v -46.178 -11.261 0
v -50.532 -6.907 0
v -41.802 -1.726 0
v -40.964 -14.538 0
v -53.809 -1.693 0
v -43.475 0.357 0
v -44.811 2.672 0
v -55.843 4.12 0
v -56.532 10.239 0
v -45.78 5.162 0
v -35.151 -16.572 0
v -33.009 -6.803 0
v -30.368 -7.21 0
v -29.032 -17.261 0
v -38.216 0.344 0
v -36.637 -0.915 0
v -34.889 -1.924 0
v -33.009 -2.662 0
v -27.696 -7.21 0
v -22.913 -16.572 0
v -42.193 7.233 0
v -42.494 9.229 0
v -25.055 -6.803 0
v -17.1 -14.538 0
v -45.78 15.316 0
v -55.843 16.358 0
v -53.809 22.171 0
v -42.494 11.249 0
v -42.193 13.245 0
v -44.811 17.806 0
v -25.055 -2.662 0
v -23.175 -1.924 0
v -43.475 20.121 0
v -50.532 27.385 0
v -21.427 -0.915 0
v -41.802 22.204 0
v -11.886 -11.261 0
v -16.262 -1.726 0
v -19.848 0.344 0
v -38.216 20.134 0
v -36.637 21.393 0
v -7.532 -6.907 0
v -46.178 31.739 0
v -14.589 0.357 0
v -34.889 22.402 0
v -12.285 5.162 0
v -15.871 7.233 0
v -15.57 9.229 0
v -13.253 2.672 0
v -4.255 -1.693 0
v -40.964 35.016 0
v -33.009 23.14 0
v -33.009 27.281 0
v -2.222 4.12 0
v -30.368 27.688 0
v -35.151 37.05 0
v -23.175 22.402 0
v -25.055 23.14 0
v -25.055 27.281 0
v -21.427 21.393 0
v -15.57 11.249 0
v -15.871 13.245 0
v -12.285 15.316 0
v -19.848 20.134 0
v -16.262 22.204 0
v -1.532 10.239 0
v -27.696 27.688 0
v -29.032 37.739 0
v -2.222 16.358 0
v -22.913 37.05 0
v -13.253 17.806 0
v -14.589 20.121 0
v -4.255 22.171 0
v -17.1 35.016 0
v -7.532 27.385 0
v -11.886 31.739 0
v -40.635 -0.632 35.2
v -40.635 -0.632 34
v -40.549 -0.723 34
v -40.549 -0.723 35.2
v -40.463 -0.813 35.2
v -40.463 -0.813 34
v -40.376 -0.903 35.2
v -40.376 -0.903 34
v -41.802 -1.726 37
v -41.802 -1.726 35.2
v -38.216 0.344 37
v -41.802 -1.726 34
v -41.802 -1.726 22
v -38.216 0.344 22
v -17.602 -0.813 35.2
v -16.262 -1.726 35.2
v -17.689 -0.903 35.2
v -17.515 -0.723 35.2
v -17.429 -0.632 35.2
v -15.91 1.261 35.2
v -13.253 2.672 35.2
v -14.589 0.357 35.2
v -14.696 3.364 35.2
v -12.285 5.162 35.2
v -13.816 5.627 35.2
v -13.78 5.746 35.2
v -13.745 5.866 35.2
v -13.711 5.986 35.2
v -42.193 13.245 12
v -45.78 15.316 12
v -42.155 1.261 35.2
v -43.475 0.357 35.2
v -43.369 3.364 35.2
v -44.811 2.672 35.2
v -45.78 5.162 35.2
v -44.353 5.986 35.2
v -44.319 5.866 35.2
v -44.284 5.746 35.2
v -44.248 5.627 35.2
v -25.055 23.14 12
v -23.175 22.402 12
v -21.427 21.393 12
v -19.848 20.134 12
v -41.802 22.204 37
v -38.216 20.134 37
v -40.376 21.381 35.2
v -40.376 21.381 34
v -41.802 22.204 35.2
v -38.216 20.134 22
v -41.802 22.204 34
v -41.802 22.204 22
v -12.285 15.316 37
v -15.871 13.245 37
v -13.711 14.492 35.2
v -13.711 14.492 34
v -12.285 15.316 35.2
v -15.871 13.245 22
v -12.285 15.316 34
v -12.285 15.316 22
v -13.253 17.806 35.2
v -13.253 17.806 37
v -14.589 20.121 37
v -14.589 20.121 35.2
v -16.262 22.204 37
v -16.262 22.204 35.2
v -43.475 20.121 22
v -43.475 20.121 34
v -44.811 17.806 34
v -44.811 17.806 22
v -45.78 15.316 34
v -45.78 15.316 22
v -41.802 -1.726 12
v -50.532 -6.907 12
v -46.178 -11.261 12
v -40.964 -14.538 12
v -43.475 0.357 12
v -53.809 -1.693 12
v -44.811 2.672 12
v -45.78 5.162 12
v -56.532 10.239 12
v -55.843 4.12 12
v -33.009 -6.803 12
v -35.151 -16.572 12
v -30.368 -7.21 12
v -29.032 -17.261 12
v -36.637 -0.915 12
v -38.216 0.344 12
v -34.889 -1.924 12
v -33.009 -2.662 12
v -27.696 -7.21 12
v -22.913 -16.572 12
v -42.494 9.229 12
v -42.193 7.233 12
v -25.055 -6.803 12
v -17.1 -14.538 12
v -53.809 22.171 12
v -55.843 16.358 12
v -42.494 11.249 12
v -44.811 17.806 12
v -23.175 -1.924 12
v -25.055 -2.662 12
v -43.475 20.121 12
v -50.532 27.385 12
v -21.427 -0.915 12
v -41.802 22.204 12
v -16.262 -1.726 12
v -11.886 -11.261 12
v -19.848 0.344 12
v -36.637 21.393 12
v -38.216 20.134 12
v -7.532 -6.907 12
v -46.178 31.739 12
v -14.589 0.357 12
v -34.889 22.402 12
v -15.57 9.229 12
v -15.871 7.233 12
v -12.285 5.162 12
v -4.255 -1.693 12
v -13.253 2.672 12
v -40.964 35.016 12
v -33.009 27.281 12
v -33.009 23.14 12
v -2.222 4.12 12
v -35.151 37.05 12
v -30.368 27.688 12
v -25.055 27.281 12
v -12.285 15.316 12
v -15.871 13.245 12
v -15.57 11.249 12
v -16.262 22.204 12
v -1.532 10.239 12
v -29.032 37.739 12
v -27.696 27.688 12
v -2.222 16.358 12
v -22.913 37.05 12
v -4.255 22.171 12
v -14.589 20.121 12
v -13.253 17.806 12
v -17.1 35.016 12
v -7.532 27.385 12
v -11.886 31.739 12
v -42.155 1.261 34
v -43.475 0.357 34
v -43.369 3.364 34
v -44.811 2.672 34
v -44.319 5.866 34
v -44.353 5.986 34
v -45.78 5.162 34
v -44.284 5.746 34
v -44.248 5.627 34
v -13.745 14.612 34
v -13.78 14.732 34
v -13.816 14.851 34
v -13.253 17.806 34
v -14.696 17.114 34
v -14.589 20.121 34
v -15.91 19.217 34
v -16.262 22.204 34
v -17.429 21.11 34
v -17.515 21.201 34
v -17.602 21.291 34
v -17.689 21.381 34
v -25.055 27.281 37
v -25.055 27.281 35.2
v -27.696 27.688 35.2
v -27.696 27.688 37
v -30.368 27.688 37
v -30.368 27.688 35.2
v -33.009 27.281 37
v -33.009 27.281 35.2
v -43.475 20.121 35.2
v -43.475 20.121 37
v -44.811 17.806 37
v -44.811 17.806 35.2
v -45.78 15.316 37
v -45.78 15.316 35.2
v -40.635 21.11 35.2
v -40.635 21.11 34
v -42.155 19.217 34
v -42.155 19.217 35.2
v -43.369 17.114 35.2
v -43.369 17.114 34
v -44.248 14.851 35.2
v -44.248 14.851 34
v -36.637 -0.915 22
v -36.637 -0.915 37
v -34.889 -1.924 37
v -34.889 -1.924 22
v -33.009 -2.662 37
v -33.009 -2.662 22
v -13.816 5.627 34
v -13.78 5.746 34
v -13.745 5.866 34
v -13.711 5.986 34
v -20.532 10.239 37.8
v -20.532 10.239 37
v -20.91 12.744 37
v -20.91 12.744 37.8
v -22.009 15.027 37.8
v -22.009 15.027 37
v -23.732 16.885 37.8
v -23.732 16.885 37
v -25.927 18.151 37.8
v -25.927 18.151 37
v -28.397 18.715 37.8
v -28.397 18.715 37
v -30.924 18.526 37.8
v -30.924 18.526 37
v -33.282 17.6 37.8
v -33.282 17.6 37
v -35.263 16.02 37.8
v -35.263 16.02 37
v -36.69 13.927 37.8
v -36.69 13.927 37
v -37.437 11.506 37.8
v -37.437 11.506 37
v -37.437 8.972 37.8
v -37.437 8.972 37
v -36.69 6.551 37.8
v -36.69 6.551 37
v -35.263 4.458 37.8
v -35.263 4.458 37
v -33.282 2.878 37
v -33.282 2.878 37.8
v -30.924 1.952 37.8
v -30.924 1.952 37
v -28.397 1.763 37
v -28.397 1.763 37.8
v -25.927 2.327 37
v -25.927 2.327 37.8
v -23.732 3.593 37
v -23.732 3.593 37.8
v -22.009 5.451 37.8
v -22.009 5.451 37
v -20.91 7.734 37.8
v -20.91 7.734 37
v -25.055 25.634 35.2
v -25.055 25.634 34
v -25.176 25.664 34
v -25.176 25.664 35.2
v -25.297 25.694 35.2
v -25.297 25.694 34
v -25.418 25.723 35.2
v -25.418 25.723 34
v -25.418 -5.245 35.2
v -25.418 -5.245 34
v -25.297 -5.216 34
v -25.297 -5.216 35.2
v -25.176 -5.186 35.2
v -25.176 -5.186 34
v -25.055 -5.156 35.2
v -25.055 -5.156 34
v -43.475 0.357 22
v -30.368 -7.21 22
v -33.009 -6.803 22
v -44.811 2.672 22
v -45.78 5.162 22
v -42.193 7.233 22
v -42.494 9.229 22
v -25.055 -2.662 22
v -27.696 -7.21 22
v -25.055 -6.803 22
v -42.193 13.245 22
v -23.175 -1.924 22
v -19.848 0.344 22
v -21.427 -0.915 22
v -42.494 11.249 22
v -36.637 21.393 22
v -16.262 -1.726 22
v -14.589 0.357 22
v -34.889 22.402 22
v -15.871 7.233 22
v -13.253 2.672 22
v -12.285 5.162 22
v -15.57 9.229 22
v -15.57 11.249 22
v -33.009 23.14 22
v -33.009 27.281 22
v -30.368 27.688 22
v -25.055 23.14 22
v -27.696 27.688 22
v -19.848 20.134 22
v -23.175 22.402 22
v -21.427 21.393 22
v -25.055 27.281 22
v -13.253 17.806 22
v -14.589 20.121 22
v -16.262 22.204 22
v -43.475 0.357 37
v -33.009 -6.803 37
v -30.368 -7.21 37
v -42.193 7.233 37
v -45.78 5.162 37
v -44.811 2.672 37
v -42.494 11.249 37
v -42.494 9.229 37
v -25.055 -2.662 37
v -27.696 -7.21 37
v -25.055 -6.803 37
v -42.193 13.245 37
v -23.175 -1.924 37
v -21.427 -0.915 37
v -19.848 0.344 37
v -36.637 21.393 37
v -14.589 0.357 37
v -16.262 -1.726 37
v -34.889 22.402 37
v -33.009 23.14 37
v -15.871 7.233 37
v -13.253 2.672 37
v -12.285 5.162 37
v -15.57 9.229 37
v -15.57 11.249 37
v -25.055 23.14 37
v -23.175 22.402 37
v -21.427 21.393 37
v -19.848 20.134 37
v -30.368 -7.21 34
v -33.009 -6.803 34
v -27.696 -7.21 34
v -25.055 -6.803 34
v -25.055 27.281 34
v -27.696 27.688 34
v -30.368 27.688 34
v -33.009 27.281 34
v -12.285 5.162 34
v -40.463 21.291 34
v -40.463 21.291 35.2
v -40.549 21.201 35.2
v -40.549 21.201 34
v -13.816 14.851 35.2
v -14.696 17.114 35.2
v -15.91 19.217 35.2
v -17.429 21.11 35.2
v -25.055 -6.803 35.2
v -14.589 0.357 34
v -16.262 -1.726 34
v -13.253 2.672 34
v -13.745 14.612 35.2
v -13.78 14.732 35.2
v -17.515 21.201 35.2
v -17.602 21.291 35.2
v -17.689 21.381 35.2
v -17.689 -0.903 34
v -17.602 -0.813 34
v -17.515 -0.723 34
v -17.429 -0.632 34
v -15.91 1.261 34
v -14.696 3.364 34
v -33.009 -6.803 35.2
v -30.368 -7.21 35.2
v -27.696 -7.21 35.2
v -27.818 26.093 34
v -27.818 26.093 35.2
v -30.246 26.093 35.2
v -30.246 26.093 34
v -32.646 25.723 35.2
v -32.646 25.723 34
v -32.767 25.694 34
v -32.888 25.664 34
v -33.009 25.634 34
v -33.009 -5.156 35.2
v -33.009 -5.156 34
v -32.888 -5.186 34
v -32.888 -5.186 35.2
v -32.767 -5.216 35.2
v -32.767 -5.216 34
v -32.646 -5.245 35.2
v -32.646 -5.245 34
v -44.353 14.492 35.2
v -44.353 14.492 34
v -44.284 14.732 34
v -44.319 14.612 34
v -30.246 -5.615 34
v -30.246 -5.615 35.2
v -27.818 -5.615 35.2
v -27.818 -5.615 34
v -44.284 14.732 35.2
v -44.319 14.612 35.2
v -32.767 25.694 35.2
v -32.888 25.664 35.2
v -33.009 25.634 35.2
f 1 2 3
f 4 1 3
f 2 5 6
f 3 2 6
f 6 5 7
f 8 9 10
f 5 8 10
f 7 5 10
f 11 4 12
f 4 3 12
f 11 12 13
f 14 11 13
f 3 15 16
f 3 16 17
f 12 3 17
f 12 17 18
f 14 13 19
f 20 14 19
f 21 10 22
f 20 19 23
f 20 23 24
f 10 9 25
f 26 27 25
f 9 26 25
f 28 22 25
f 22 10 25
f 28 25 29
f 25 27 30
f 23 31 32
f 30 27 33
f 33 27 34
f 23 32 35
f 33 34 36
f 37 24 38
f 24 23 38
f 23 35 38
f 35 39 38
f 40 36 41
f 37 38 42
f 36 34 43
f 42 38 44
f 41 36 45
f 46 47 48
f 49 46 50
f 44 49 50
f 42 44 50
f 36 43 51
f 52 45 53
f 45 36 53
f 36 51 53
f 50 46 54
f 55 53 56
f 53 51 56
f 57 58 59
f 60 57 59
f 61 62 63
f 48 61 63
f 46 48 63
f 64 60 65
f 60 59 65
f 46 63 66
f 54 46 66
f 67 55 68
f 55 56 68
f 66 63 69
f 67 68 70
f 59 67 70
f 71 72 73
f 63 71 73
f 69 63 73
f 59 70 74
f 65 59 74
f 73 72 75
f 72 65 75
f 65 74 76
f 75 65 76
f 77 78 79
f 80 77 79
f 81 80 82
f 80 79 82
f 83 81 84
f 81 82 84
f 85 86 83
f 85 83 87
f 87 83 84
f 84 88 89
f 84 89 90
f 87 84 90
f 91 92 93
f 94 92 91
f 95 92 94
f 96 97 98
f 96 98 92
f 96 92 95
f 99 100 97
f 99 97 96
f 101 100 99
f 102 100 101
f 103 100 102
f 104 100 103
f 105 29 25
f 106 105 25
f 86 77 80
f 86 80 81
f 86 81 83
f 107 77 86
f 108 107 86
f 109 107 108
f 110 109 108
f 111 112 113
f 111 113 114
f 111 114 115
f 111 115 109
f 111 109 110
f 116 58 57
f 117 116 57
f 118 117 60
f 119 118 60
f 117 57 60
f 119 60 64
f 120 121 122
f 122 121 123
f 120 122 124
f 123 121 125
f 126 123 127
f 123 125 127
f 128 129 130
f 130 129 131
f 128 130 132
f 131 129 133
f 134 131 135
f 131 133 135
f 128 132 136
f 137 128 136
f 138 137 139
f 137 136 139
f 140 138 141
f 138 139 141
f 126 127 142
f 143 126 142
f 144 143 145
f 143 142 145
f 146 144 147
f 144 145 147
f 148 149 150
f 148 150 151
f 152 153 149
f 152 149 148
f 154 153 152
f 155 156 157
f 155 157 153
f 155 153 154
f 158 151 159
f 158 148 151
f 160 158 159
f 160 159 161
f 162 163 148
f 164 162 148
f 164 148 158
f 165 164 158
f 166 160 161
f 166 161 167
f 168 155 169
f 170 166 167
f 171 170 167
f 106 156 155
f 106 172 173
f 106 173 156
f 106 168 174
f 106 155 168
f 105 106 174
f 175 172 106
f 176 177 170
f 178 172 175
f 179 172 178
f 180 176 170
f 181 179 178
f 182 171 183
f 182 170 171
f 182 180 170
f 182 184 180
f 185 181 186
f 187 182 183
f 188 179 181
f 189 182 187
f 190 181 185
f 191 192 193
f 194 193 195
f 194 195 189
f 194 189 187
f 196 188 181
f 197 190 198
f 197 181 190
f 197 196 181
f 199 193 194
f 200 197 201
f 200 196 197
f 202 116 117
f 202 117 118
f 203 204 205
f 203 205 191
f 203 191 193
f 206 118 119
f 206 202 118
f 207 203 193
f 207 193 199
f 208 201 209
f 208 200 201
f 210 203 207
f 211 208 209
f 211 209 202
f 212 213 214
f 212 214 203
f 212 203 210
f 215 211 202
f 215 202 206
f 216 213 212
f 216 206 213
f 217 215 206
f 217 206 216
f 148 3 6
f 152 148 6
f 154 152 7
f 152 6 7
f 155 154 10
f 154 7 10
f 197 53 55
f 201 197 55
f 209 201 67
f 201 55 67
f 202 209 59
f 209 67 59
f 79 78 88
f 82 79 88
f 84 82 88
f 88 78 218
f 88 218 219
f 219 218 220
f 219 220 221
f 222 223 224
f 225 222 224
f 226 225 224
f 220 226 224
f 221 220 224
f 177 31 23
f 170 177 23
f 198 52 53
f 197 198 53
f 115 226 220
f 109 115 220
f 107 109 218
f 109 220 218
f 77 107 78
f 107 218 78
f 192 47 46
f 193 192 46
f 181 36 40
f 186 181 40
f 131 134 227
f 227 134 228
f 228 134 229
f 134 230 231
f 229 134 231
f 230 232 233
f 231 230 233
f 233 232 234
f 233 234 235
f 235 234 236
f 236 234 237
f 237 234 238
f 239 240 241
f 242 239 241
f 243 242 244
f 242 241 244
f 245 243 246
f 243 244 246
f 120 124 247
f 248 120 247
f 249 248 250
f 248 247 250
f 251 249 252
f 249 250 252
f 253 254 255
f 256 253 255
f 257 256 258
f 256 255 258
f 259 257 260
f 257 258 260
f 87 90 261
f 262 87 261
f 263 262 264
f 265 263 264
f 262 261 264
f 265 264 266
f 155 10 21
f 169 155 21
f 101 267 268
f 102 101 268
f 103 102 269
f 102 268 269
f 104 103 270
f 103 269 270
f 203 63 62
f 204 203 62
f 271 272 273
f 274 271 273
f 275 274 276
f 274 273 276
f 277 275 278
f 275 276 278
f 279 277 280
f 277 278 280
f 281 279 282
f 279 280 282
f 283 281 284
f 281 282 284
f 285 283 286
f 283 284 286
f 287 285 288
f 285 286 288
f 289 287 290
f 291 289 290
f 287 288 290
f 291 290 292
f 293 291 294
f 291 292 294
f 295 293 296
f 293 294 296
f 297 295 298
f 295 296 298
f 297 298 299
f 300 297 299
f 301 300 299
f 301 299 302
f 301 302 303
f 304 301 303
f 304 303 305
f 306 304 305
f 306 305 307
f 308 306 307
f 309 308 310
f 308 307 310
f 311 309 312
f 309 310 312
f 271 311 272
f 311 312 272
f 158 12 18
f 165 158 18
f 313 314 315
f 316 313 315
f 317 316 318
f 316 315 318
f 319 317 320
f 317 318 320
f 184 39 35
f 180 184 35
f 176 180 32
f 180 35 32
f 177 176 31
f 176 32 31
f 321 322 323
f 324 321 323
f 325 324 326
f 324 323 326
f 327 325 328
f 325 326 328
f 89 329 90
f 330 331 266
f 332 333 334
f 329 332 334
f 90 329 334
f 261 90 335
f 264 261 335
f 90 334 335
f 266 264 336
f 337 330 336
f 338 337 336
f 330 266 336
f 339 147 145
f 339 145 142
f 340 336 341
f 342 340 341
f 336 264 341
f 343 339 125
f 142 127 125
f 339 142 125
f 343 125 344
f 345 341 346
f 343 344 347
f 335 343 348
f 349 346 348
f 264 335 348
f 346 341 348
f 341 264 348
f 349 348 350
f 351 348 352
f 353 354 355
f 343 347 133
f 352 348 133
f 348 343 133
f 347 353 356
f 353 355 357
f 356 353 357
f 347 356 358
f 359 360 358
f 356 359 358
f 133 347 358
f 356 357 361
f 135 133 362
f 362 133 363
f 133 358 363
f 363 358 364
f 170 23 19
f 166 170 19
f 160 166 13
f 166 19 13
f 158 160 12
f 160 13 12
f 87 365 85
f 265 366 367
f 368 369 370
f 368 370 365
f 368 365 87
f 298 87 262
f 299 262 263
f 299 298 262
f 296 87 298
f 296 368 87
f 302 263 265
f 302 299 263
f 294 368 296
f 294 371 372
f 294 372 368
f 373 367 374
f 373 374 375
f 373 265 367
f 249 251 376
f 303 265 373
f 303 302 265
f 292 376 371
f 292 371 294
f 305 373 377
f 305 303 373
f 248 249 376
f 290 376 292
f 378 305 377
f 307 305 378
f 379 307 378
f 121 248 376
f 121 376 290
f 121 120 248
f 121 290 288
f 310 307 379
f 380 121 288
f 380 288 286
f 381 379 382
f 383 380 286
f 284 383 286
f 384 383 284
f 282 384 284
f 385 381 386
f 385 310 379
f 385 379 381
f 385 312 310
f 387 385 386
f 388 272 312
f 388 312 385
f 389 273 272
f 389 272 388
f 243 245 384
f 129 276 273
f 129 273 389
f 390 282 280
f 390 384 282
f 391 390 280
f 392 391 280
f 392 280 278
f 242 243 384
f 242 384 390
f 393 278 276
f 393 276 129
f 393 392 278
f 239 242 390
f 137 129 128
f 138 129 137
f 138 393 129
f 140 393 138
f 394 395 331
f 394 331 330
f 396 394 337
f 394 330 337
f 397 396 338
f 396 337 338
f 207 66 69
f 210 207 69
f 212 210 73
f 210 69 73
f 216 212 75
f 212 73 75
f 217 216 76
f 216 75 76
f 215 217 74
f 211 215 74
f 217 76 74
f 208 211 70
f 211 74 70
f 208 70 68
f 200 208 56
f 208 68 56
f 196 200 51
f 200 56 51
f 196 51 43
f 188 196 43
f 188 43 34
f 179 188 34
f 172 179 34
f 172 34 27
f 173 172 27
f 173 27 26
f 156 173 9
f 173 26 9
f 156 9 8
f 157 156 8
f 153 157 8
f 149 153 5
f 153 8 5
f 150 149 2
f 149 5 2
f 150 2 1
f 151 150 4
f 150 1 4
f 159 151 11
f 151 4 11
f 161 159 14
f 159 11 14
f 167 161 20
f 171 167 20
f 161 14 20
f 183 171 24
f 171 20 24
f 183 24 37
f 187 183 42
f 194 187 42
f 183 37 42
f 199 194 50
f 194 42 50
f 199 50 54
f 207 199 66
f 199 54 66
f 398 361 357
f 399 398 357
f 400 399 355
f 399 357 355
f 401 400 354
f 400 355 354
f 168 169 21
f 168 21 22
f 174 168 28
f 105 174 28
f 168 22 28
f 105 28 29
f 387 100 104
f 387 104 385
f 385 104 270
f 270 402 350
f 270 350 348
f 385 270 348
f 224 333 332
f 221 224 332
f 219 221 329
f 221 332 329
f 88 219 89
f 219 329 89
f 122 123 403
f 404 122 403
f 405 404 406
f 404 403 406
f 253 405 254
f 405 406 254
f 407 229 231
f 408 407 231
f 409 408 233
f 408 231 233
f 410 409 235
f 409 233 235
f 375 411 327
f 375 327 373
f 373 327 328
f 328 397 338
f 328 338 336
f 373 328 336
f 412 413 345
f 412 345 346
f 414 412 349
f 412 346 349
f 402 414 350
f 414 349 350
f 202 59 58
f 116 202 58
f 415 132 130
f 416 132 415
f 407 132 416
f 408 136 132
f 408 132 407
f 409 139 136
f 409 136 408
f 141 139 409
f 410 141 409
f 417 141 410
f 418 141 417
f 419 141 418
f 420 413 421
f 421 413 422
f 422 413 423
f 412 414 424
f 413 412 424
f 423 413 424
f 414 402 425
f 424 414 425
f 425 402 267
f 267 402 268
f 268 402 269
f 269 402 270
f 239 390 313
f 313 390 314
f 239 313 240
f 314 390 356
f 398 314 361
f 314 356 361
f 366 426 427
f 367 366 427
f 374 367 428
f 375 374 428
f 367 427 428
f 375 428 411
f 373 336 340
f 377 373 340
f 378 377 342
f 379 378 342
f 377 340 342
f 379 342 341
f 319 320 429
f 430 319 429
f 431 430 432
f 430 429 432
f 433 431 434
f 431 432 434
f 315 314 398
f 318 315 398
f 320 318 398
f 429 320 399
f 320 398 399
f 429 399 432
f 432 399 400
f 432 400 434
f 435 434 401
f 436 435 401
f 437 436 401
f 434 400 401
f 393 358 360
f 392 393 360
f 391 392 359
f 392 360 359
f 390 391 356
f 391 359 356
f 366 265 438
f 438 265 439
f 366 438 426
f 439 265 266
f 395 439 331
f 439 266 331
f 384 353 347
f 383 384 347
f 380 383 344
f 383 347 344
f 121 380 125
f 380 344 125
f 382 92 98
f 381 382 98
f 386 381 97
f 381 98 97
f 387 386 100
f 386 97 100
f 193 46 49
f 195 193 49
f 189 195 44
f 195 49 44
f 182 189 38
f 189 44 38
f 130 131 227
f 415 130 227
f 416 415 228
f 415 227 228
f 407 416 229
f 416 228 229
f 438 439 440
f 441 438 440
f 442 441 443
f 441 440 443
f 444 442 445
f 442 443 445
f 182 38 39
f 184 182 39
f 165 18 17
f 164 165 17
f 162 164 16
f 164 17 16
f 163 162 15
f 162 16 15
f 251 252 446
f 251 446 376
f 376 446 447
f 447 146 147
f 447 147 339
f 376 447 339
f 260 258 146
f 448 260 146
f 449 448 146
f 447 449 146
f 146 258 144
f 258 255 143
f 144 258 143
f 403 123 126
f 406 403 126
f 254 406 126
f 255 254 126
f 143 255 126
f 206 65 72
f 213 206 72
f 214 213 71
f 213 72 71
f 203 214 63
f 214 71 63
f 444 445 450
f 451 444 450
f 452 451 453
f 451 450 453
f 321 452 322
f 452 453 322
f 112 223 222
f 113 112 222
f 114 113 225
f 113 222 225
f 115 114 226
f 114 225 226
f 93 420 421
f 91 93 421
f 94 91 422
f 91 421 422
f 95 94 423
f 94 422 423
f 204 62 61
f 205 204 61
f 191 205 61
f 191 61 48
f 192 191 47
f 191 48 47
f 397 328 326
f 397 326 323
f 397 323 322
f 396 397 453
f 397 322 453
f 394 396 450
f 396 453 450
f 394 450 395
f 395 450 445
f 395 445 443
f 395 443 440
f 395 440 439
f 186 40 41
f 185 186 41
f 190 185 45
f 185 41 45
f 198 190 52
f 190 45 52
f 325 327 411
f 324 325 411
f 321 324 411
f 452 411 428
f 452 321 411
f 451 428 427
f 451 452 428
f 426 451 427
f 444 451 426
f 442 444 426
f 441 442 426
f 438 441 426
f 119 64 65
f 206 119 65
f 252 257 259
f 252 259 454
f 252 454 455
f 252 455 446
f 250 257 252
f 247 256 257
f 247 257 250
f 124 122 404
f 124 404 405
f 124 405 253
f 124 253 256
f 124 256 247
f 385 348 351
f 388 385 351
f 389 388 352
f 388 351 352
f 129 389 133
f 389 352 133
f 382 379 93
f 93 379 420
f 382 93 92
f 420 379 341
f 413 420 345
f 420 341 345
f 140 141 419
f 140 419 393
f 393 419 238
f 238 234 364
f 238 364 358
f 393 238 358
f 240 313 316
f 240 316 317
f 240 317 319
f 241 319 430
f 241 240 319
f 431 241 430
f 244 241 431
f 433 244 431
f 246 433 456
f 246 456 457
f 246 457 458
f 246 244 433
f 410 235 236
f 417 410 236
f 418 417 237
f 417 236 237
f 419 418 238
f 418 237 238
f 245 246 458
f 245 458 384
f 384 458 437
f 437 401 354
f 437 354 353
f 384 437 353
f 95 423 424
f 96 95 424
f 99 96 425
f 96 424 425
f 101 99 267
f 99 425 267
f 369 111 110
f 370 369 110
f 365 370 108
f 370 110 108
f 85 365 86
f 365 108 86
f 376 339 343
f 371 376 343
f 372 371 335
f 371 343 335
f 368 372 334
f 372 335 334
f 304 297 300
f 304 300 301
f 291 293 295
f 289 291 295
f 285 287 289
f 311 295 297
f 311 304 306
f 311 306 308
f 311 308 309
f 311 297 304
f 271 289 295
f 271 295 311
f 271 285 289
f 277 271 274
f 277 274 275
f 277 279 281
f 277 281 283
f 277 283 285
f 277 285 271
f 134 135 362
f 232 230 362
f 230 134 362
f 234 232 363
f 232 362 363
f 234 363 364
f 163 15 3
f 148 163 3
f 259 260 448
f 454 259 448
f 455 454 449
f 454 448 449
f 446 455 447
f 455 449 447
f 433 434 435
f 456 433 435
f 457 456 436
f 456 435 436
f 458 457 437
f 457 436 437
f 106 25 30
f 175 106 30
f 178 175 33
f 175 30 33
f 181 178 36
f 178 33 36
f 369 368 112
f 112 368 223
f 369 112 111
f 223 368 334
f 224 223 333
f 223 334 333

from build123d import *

# Parameters (mm, degrees)
TIRE_OUTBOARD_SPLINES_OUTLINE_R = 27.5
TIRE_OUTBOARD_SPLINES_DEPTH     = 12
BOSS_EXTRUDE1_DEPTH             = 15
CUT_EXTRUDE1_DEPTH              = 1.2
SKETCH4_R                       = 8.5
BOSS_EXTRUDE2_DEPTH             = 0.8


# Read off the part's stored shape, not the designer's step: Tire_Outboard_Splines
with BuildPart() as part:
    # Tire_Outboard_Splines outline → Tire_Outboard_Splines (new body)
    with BuildSketch(Plane.XY):
        with Locations((-29.032124352, 10.239008142)):
            Circle(TIRE_OUTBOARD_SPLINES_OUTLINE_R)
        with BuildLine():
            Line((-41.802331989, 22.204449918), (-38.215930705, 20.133840171))
            ThreePointArc((-38.215930705, 20.133840171), (-35.782124353, 21.930351093), (-33.00939708, 23.139833761))
            Line((-33.00939708, 23.139833761), (-33.00939708, 27.281053256))
            ThreePointArc((-33.00939708, 27.281053256), (-29.032124353, 27.739008142), (-25.054851625, 27.281053256))
            Line((-25.054851625, 27.281053256), (-25.054851625, 23.139833761))
            ThreePointArc((-25.054851625, 23.139833761), (-22.282124352, 21.930351093), (-19.848318, 20.133840171))
            Line((-19.848318, 20.133840171), (-16.261916715, 22.204449918))
            ThreePointArc((-16.261916715, 22.204449918), (-13.876679786, 18.989008142), (-12.284643988, 15.315611479))
            Line((-12.284643988, 15.315611479), (-15.871045273, 13.245001732))
            ThreePointArc((-15.871045273, 13.245001732), (-15.532124352, 10.239008142), (-15.871045273, 7.233014552))
            Line((-15.871045273, 7.233014552), (-12.284643988, 5.162404805))
            ThreePointArc((-12.284643988, 5.162404805), (-13.876679786, 1.489008142), (-16.261916715, -1.726433634))
            Line((-16.261916715, -1.726433634), (-19.848318, 0.344176113))
            ThreePointArc((-19.848318, 0.344176113), (-22.282124352, -1.452334809), (-25.054851625, -2.661817477))
            Line((-25.054851625, -2.661817477), (-25.054851625, -6.803036971))
            ThreePointArc((-25.054851625, -6.803036971), (-29.032124352, -7.260991858), (-33.00939708, -6.803036971))
            Line((-33.00939708, -6.803036971), (-33.00939708, -2.661817477))
            ThreePointArc((-33.00939708, -2.661817477), (-35.782124353, -1.452334809), (-38.215930705, 0.344176113))
            Line((-38.215930705, 0.344176113), (-41.802331989, -1.726433634))
            ThreePointArc((-41.802331989, -1.726433634), (-44.187568919, 1.489008142), (-45.779604717, 5.162404805))
            Line((-45.779604717, 5.162404805), (-42.193203432, 7.233014552))
            ThreePointArc((-42.193203432, 7.233014552), (-42.532124352, 10.239008142), (-42.193203432, 13.245001732))
            Line((-42.193203432, 13.245001732), (-45.779604717, 15.315611479))
            ThreePointArc((-45.779604717, 15.315611479), (-44.187568919, 18.989008142), (-41.802331989, 22.204449918))
        make_face(mode=Mode.SUBTRACT)
    extrude(amount=TIRE_OUTBOARD_SPLINES_DEPTH)


with BuildPart() as body_2:
    # Sketch3 → Boss-Extrude1 (new body)
    with BuildSketch(Plane.XY.offset(22)):
        with BuildLine():
            Line((-45.779604717, 15.315611479), (-42.193203432, 13.245001732))
            ThreePointArc((-42.193203432, 13.245001732), (-42.532124352, 10.239008142), (-42.193203432, 7.233014552))
            Line((-42.193203432, 7.233014552), (-45.779604717, 5.162404805))
            ThreePointArc((-45.779604717, 5.162404805), (-44.187568919, 1.489008142), (-41.802331989, -1.726433634))
            Line((-41.802331989, -1.726433634), (-38.215930705, 0.344176113))
            ThreePointArc((-38.215930705, 0.344176113), (-35.782124352, -1.452334809), (-33.00939708, -2.661817477))
            Line((-33.00939708, -2.661817477), (-33.00939708, -6.803036971))
            ThreePointArc((-33.00939708, -6.803036971), (-29.032124352, -7.260991858), (-25.054851625, -6.803036971))
            Line((-25.054851625, -6.803036971), (-25.054851625, -2.661817477))
            ThreePointArc((-25.054851625, -2.661817477), (-22.282124352, -1.452334809), (-19.848318, 0.344176113))
            Line((-19.848318, 0.344176113), (-16.261916715, -1.726433634))
            ThreePointArc((-16.261916715, -1.726433634), (-13.876679786, 1.489008142), (-12.284643988, 5.162404805))
            Line((-12.284643988, 5.162404805), (-15.871045273, 7.233014552))
            ThreePointArc((-15.871045273, 7.233014552), (-15.532124352, 10.239008142), (-15.871045273, 13.245001732))
            Line((-15.871045273, 13.245001732), (-12.284643988, 15.315611479))
            ThreePointArc((-12.284643988, 15.315611479), (-13.876679786, 18.989008142), (-16.261916715, 22.204449918))
            Line((-16.261916715, 22.204449918), (-19.848318, 20.133840171))
            ThreePointArc((-19.848318, 20.133840171), (-22.282124352, 21.930351093), (-25.054851625, 23.139833761))
            Line((-25.054851625, 23.139833761), (-25.054851625, 27.281053256))
            ThreePointArc((-25.054851625, 27.281053256), (-29.032124352, 27.739008142), (-33.00939708, 27.281053256))
            Line((-33.00939708, 27.281053256), (-33.00939708, 23.139833761))
            ThreePointArc((-33.00939708, 23.139833761), (-35.782124352, 21.930351093), (-38.215930705, 20.133840171))
            Line((-38.215930705, 20.133840171), (-41.802331989, 22.204449918))
            ThreePointArc((-41.802331989, 22.204449918), (-44.187568919, 18.989008142), (-45.779604717, 15.315611479))
        make_face()
    extrude(amount=BOSS_EXTRUDE1_DEPTH)

    # Sketch5 → Cut-Extrude1 (cut)
    with BuildSketch(Plane(origin=(0, 0, 34), x_dir=(-1, 0, 0), z_dir=(0, 0, -1))):
        with BuildLine():
            ThreePointArc((16.261916715, 22.204449918), (13.876679786, 18.989008142), (12.284643988, 15.315611479))
            ThreePointArc((12.284643988, 15.315611479), (11.532124352, 10.239008142), (12.284643988, 5.162404805))
            ThreePointArc((12.284643988, 5.162404805), (13.876679786, 1.489008142), (16.261916715, -1.726433634))
            ThreePointArc((16.261916715, -1.726433634), (20.282124352, -4.916436424), (25.054851625, -6.803036971))
            ThreePointArc((25.054851625, -6.803036971), (29.032124352, -7.260991858), (33.00939708, -6.803036971))
            ThreePointArc((33.00939708, -6.803036971), (37.782124352, -4.916436424), (41.802331989, -1.726433634))
            ThreePointArc((41.802331989, -1.726433634), (44.187568919, 1.489008142), (45.779604717, 5.162404805))
            ThreePointArc((45.779604717, 5.162404805), (46.532124352, 10.239008142), (45.779604717, 15.315611479))
            ThreePointArc((45.779604717, 15.315611479), (44.187568919, 18.989008142), (41.802331989, 22.204449918))
            ThreePointArc((41.802331989, 22.204449918), (37.782124352, 25.394452708), (33.00939708, 27.281053256))
            ThreePointArc((33.00939708, 27.281053256), (29.032124352, 27.739008142), (25.054851625, 27.281053256))
            ThreePointArc((25.054851625, 27.281053256), (20.282124352, 25.394452708), (16.261916715, 22.204449918))
        make_face()
        with BuildLine():
            ThreePointArc((13.815842193, 5.626551396), (13.132124352, 10.239008142), (13.815842193, 14.851464888))
            ThreePointArc((13.815842193, 14.851464888), (15.262320432, 18.189008142), (17.429478556, 21.11046667))
            ThreePointArc((17.429478556, 21.11046667), (21.082124352, 24.008812062), (25.418487989, 25.722923417))
            ThreePointArc((25.418487989, 25.722923417), (29.032124352, 26.139008142), (32.645760716, 25.722923417))
            ThreePointArc((32.645760716, 25.722923417), (36.982124352, 24.008812062), (40.634770148, 21.11046667))
            ThreePointArc((40.634770148, 21.11046667), (42.801928273, 18.189008142), (44.248406512, 14.851464888))
            ThreePointArc((44.248406512, 14.851464888), (44.932124352, 10.239008142), (44.248406512, 5.626551396))
            ThreePointArc((44.248406512, 5.626551396), (42.801928273, 2.289008142), (40.634770148, -0.632450386))
            ThreePointArc((40.634770148, -0.632450386), (36.982124352, -3.530795778), (32.645760716, -5.244907132))
            ThreePointArc((32.645760716, -5.244907132), (29.032124352, -5.660991858), (25.418487989, -5.244907132))
            ThreePointArc((25.418487989, -5.244907132), (21.082124352, -3.530795778), (17.429478556, -0.632450386))
            ThreePointArc((17.429478556, -0.632450386), (15.262320432, 2.289008142), (13.815842193, 5.626551396))
        make_face(mode=Mode.SUBTRACT)
    extrude(amount=-CUT_EXTRUDE1_DEPTH, mode=Mode.SUBTRACT)

    # Sketch4 → Boss-Extrude2 (add)
    with BuildSketch(Plane.XY.offset(37)):
        with Locations((-29.032124352, 10.239008142)):
            Circle(SKETCH4_R)
    extrude(amount=BOSS_EXTRUDE2_DEPTH)


solid = Compound([part.part, body_2.part])
